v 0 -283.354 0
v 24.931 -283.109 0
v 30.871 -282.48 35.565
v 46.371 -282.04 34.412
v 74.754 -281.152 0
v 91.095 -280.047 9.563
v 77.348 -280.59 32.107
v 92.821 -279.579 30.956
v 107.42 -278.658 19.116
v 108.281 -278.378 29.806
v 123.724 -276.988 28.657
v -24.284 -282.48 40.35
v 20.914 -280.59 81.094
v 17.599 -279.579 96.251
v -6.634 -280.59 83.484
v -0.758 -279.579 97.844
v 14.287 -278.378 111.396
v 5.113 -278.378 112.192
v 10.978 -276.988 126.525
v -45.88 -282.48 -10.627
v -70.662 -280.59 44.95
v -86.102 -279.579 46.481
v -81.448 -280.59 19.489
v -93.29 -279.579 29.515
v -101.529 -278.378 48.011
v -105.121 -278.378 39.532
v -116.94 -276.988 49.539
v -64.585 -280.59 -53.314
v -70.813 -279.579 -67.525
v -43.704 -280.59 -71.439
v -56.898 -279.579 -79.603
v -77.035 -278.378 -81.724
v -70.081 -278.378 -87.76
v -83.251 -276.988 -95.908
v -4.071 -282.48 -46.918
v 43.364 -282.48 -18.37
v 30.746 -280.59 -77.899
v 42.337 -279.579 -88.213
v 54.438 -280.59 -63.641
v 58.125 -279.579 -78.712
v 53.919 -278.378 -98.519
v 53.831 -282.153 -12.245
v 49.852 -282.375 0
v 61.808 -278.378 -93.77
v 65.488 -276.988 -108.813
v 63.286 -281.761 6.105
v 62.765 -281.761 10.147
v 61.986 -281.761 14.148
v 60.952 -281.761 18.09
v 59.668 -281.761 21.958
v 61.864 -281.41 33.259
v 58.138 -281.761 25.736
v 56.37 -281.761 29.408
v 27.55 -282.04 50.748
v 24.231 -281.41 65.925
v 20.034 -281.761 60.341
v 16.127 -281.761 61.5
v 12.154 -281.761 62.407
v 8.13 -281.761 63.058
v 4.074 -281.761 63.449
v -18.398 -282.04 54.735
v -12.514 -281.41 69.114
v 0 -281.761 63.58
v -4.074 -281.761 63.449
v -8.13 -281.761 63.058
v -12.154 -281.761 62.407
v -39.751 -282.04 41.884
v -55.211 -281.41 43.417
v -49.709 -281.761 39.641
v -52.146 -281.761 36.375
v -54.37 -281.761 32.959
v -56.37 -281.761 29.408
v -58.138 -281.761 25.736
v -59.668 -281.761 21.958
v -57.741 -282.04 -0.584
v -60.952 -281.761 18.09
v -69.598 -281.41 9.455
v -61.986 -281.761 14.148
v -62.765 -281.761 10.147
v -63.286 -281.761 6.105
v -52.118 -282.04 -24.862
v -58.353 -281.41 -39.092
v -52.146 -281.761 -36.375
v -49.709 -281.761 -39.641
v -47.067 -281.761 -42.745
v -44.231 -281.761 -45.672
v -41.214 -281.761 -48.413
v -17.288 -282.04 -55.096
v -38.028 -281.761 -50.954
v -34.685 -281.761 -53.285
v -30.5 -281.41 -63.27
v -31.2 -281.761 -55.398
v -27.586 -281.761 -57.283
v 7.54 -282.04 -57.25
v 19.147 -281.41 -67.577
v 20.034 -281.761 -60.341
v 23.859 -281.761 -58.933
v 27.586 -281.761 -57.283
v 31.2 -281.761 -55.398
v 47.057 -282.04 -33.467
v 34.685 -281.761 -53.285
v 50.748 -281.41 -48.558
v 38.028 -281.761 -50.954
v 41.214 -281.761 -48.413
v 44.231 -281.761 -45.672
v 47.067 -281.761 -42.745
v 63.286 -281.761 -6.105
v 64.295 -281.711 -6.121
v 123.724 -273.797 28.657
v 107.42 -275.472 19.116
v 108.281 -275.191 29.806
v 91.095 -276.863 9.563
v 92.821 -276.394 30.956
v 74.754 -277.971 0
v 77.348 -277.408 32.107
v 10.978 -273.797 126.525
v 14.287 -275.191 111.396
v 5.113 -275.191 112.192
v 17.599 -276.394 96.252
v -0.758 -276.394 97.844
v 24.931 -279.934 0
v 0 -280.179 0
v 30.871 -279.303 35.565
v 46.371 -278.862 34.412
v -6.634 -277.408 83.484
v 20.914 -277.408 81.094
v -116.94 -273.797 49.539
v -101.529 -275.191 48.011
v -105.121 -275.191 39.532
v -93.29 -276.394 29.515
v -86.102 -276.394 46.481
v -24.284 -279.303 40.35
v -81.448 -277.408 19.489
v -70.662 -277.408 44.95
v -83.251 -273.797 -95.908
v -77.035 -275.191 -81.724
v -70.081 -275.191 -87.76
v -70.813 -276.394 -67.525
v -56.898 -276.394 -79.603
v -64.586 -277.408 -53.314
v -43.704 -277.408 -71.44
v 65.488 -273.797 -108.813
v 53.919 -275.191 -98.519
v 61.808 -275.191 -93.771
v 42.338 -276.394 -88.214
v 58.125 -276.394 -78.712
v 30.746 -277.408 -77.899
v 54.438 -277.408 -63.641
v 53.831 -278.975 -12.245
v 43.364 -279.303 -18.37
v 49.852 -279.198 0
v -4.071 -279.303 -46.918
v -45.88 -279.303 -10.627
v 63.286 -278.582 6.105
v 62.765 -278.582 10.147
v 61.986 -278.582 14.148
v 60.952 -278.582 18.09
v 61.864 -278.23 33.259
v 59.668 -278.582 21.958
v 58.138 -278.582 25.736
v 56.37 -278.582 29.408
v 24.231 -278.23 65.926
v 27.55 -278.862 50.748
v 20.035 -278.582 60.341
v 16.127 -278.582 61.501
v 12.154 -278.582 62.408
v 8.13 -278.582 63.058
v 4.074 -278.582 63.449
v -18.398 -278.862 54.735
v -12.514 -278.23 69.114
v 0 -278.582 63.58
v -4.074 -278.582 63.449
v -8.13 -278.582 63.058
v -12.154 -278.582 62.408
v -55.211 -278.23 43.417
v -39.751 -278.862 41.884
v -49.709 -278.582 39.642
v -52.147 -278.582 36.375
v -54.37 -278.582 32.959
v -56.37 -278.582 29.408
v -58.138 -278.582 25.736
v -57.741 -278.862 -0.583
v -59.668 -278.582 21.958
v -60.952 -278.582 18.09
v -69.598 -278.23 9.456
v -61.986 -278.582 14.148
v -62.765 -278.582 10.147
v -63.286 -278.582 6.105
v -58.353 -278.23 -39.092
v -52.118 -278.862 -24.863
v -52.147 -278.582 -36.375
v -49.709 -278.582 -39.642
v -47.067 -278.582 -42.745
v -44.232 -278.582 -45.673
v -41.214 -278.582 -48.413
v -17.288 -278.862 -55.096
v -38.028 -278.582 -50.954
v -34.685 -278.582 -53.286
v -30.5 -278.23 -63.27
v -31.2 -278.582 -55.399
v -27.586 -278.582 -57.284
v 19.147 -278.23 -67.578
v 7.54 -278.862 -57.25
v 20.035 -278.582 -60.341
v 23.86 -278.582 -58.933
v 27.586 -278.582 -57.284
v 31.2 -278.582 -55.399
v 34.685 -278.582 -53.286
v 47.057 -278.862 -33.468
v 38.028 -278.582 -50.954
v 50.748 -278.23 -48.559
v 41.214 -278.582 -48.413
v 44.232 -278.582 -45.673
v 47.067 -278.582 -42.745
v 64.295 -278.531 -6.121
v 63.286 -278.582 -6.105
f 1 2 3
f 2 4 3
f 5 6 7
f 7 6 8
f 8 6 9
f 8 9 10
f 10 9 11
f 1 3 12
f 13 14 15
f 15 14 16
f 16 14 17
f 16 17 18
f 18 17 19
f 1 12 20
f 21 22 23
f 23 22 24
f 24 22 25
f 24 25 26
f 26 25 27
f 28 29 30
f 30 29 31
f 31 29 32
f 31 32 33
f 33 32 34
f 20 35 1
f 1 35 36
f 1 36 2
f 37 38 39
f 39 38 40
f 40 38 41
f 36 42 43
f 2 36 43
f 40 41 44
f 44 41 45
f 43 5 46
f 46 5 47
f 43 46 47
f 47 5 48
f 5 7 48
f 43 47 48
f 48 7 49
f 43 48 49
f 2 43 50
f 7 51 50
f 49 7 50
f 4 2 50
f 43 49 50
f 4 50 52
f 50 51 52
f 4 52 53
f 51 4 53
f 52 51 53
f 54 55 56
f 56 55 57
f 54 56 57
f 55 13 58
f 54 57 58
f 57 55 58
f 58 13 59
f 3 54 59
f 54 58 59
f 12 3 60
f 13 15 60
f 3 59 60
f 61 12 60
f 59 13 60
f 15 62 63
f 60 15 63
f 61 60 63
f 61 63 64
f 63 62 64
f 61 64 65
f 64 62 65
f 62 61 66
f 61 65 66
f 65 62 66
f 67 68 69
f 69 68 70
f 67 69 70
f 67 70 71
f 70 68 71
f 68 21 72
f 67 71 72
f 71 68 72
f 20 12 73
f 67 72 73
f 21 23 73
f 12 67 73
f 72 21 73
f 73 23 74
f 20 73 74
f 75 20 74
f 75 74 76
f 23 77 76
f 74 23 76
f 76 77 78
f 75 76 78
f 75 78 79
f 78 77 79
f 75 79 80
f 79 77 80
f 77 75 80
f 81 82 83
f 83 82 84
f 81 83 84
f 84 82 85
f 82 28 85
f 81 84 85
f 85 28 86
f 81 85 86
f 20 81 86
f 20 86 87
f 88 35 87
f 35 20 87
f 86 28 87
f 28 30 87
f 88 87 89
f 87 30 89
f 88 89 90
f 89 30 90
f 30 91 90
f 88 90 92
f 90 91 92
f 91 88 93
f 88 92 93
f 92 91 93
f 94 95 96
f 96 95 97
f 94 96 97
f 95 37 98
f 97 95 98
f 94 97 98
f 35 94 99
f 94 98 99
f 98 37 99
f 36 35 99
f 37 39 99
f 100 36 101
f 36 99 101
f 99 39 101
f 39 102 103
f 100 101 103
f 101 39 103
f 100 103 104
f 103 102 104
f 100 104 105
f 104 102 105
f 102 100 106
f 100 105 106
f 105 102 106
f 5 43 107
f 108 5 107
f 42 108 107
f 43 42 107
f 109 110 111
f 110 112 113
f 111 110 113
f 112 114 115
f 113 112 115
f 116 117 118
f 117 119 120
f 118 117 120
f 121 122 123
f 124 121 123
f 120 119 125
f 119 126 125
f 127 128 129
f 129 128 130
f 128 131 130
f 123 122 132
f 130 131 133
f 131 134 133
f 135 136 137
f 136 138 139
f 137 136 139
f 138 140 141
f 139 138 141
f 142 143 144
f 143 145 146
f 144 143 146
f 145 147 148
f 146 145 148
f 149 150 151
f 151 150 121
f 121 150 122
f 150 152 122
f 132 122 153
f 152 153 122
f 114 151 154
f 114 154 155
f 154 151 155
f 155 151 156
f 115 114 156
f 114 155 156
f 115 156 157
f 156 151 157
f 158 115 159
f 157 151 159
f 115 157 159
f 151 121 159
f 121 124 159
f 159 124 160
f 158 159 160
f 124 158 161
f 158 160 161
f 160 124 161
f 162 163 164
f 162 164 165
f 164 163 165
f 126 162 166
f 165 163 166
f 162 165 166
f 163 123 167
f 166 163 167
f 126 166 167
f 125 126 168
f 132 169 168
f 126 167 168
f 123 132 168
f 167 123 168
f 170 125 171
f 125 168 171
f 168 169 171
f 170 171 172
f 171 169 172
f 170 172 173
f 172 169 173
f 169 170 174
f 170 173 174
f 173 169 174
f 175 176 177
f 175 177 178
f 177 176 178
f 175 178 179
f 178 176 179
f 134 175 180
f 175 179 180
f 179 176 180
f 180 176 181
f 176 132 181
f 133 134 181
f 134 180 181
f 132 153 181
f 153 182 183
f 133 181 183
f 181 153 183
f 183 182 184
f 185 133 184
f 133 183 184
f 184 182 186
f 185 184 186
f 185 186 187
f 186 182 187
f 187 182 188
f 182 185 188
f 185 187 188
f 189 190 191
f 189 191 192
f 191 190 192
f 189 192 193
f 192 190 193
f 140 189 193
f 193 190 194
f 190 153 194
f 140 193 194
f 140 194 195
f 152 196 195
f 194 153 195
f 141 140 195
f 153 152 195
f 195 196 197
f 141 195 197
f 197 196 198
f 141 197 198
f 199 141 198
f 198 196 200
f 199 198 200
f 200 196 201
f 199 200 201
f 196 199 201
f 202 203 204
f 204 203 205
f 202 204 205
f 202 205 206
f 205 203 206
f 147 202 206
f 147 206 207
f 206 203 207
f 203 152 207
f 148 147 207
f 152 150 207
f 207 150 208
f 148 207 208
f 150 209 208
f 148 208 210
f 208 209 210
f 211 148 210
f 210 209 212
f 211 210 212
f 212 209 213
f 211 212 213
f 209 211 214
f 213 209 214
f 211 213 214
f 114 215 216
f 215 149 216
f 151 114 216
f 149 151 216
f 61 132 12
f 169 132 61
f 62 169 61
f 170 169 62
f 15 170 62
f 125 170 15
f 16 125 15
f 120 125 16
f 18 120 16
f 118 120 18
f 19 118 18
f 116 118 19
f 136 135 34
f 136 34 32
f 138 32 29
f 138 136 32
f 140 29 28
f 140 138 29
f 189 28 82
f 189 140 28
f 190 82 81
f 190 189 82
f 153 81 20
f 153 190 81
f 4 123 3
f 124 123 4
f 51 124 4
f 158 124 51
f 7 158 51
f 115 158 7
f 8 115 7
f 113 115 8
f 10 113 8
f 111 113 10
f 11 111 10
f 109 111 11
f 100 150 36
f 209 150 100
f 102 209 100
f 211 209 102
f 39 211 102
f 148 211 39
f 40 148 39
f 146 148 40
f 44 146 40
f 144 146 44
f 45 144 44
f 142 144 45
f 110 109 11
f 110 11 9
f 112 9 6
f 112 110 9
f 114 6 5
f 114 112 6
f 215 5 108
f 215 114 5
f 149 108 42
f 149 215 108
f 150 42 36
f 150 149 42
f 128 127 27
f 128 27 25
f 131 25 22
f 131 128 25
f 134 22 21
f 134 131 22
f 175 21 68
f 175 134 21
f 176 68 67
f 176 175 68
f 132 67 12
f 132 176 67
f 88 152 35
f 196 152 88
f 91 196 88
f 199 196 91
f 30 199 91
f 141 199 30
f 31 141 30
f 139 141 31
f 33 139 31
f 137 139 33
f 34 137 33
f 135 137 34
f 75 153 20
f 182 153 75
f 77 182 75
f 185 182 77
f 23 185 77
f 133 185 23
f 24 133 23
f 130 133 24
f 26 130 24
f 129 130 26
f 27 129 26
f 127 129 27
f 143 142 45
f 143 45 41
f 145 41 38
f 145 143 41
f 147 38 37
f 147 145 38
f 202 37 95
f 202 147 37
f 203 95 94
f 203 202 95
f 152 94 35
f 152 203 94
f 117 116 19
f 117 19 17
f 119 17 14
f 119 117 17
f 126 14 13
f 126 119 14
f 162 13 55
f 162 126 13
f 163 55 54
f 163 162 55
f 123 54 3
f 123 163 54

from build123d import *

# Parameters (mm, degrees)
F3_DEPTH = 283.3549028797


with BuildPart() as f1:
    # F0 (on Top) → F1 (revolve)
    with BuildSketch(Plane.XY):
        with BuildLine():
            Line((0, -280.1789028797), (0, -283.3539028797))
            ThreePointArc((0, -283.3539028797), (63.5797243259, -281.7614157298), (127, -276.9879480051))
            Line((127, -276.9879480051), (127, -273.7969125493))
            ThreePointArc((127, -273.7969125493), (63.5801262199, -278.5823993082), (0, -280.1789028797))
        make_face()
    revolve(axis=Axis((0, -280.1789028797, 0), (0, -1, 0)))

    # F2 (on Front) → F3 (cut, through all)
    with BuildSketch(Plane.XZ):
        with BuildLine():
            ThreePointArc((-116.9396589005, 49.5390368924), (-123.7244866651, -28.6574841789), (-83.2507657642, -95.907820326))
            Line((-83.2507657642, -95.907820326), (-45.8795627998, -10.6267795528))
            Line((-45.8795627998, -10.6267795528), (-116.9396589005, 49.5390368924))
        make_face()
        with BuildLine():
            ThreePointArc((-83.2507657642, -95.907820326), (-10.9780819308, -126.5246288954), (65.4878560688, -108.8133296408))
            Line((65.4878560688, -108.8133296408), (-4.0708966587, -46.9179126428))
            Line((-4.0708966587, -46.9179126428), (-83.2507657642, -95.907820326))
        make_face()
        with BuildLine():
            ThreePointArc((65.4878560688, -108.8133296408), (110.5575816503, -62.4981690902), (127, 0))
            ThreePointArc((127, 0), (126.1784644986, 14.4220351119), (123.7244866651, 28.6574841789))
            Line((123.7244866651, 28.6574841789), (43.3636103, -18.3700851417))
            Line((43.3636103, -18.3700851417), (65.4878560688, -108.8133296408))
        make_face()
        with BuildLine():
            Line((30.871081699, 35.564575649), (123.7244866651, 28.6574841789))
            ThreePointArc((123.7244866651, 28.6574841789), (83.2507657642, 95.907820326), (10.9780819308, 126.5246288954))
            Line((10.9780819308, 126.5246288954), (30.871081699, 35.564575649))
        make_face()
        with BuildLine():
            Line((-24.2842325405, 40.3502016882), (10.9780819308, 126.5246288954))
            ThreePointArc((10.9780819308, 126.5246288954), (-65.4878560688, 108.8133296408), (-116.9396589005, 49.5390368924))
            Line((-116.9396589005, 49.5390368924), (-24.2842325405, 40.3502016882))
        make_face()
    extrude(amount=F3_DEPTH, mode=Mode.SUBTRACT)


solid = f1.part
